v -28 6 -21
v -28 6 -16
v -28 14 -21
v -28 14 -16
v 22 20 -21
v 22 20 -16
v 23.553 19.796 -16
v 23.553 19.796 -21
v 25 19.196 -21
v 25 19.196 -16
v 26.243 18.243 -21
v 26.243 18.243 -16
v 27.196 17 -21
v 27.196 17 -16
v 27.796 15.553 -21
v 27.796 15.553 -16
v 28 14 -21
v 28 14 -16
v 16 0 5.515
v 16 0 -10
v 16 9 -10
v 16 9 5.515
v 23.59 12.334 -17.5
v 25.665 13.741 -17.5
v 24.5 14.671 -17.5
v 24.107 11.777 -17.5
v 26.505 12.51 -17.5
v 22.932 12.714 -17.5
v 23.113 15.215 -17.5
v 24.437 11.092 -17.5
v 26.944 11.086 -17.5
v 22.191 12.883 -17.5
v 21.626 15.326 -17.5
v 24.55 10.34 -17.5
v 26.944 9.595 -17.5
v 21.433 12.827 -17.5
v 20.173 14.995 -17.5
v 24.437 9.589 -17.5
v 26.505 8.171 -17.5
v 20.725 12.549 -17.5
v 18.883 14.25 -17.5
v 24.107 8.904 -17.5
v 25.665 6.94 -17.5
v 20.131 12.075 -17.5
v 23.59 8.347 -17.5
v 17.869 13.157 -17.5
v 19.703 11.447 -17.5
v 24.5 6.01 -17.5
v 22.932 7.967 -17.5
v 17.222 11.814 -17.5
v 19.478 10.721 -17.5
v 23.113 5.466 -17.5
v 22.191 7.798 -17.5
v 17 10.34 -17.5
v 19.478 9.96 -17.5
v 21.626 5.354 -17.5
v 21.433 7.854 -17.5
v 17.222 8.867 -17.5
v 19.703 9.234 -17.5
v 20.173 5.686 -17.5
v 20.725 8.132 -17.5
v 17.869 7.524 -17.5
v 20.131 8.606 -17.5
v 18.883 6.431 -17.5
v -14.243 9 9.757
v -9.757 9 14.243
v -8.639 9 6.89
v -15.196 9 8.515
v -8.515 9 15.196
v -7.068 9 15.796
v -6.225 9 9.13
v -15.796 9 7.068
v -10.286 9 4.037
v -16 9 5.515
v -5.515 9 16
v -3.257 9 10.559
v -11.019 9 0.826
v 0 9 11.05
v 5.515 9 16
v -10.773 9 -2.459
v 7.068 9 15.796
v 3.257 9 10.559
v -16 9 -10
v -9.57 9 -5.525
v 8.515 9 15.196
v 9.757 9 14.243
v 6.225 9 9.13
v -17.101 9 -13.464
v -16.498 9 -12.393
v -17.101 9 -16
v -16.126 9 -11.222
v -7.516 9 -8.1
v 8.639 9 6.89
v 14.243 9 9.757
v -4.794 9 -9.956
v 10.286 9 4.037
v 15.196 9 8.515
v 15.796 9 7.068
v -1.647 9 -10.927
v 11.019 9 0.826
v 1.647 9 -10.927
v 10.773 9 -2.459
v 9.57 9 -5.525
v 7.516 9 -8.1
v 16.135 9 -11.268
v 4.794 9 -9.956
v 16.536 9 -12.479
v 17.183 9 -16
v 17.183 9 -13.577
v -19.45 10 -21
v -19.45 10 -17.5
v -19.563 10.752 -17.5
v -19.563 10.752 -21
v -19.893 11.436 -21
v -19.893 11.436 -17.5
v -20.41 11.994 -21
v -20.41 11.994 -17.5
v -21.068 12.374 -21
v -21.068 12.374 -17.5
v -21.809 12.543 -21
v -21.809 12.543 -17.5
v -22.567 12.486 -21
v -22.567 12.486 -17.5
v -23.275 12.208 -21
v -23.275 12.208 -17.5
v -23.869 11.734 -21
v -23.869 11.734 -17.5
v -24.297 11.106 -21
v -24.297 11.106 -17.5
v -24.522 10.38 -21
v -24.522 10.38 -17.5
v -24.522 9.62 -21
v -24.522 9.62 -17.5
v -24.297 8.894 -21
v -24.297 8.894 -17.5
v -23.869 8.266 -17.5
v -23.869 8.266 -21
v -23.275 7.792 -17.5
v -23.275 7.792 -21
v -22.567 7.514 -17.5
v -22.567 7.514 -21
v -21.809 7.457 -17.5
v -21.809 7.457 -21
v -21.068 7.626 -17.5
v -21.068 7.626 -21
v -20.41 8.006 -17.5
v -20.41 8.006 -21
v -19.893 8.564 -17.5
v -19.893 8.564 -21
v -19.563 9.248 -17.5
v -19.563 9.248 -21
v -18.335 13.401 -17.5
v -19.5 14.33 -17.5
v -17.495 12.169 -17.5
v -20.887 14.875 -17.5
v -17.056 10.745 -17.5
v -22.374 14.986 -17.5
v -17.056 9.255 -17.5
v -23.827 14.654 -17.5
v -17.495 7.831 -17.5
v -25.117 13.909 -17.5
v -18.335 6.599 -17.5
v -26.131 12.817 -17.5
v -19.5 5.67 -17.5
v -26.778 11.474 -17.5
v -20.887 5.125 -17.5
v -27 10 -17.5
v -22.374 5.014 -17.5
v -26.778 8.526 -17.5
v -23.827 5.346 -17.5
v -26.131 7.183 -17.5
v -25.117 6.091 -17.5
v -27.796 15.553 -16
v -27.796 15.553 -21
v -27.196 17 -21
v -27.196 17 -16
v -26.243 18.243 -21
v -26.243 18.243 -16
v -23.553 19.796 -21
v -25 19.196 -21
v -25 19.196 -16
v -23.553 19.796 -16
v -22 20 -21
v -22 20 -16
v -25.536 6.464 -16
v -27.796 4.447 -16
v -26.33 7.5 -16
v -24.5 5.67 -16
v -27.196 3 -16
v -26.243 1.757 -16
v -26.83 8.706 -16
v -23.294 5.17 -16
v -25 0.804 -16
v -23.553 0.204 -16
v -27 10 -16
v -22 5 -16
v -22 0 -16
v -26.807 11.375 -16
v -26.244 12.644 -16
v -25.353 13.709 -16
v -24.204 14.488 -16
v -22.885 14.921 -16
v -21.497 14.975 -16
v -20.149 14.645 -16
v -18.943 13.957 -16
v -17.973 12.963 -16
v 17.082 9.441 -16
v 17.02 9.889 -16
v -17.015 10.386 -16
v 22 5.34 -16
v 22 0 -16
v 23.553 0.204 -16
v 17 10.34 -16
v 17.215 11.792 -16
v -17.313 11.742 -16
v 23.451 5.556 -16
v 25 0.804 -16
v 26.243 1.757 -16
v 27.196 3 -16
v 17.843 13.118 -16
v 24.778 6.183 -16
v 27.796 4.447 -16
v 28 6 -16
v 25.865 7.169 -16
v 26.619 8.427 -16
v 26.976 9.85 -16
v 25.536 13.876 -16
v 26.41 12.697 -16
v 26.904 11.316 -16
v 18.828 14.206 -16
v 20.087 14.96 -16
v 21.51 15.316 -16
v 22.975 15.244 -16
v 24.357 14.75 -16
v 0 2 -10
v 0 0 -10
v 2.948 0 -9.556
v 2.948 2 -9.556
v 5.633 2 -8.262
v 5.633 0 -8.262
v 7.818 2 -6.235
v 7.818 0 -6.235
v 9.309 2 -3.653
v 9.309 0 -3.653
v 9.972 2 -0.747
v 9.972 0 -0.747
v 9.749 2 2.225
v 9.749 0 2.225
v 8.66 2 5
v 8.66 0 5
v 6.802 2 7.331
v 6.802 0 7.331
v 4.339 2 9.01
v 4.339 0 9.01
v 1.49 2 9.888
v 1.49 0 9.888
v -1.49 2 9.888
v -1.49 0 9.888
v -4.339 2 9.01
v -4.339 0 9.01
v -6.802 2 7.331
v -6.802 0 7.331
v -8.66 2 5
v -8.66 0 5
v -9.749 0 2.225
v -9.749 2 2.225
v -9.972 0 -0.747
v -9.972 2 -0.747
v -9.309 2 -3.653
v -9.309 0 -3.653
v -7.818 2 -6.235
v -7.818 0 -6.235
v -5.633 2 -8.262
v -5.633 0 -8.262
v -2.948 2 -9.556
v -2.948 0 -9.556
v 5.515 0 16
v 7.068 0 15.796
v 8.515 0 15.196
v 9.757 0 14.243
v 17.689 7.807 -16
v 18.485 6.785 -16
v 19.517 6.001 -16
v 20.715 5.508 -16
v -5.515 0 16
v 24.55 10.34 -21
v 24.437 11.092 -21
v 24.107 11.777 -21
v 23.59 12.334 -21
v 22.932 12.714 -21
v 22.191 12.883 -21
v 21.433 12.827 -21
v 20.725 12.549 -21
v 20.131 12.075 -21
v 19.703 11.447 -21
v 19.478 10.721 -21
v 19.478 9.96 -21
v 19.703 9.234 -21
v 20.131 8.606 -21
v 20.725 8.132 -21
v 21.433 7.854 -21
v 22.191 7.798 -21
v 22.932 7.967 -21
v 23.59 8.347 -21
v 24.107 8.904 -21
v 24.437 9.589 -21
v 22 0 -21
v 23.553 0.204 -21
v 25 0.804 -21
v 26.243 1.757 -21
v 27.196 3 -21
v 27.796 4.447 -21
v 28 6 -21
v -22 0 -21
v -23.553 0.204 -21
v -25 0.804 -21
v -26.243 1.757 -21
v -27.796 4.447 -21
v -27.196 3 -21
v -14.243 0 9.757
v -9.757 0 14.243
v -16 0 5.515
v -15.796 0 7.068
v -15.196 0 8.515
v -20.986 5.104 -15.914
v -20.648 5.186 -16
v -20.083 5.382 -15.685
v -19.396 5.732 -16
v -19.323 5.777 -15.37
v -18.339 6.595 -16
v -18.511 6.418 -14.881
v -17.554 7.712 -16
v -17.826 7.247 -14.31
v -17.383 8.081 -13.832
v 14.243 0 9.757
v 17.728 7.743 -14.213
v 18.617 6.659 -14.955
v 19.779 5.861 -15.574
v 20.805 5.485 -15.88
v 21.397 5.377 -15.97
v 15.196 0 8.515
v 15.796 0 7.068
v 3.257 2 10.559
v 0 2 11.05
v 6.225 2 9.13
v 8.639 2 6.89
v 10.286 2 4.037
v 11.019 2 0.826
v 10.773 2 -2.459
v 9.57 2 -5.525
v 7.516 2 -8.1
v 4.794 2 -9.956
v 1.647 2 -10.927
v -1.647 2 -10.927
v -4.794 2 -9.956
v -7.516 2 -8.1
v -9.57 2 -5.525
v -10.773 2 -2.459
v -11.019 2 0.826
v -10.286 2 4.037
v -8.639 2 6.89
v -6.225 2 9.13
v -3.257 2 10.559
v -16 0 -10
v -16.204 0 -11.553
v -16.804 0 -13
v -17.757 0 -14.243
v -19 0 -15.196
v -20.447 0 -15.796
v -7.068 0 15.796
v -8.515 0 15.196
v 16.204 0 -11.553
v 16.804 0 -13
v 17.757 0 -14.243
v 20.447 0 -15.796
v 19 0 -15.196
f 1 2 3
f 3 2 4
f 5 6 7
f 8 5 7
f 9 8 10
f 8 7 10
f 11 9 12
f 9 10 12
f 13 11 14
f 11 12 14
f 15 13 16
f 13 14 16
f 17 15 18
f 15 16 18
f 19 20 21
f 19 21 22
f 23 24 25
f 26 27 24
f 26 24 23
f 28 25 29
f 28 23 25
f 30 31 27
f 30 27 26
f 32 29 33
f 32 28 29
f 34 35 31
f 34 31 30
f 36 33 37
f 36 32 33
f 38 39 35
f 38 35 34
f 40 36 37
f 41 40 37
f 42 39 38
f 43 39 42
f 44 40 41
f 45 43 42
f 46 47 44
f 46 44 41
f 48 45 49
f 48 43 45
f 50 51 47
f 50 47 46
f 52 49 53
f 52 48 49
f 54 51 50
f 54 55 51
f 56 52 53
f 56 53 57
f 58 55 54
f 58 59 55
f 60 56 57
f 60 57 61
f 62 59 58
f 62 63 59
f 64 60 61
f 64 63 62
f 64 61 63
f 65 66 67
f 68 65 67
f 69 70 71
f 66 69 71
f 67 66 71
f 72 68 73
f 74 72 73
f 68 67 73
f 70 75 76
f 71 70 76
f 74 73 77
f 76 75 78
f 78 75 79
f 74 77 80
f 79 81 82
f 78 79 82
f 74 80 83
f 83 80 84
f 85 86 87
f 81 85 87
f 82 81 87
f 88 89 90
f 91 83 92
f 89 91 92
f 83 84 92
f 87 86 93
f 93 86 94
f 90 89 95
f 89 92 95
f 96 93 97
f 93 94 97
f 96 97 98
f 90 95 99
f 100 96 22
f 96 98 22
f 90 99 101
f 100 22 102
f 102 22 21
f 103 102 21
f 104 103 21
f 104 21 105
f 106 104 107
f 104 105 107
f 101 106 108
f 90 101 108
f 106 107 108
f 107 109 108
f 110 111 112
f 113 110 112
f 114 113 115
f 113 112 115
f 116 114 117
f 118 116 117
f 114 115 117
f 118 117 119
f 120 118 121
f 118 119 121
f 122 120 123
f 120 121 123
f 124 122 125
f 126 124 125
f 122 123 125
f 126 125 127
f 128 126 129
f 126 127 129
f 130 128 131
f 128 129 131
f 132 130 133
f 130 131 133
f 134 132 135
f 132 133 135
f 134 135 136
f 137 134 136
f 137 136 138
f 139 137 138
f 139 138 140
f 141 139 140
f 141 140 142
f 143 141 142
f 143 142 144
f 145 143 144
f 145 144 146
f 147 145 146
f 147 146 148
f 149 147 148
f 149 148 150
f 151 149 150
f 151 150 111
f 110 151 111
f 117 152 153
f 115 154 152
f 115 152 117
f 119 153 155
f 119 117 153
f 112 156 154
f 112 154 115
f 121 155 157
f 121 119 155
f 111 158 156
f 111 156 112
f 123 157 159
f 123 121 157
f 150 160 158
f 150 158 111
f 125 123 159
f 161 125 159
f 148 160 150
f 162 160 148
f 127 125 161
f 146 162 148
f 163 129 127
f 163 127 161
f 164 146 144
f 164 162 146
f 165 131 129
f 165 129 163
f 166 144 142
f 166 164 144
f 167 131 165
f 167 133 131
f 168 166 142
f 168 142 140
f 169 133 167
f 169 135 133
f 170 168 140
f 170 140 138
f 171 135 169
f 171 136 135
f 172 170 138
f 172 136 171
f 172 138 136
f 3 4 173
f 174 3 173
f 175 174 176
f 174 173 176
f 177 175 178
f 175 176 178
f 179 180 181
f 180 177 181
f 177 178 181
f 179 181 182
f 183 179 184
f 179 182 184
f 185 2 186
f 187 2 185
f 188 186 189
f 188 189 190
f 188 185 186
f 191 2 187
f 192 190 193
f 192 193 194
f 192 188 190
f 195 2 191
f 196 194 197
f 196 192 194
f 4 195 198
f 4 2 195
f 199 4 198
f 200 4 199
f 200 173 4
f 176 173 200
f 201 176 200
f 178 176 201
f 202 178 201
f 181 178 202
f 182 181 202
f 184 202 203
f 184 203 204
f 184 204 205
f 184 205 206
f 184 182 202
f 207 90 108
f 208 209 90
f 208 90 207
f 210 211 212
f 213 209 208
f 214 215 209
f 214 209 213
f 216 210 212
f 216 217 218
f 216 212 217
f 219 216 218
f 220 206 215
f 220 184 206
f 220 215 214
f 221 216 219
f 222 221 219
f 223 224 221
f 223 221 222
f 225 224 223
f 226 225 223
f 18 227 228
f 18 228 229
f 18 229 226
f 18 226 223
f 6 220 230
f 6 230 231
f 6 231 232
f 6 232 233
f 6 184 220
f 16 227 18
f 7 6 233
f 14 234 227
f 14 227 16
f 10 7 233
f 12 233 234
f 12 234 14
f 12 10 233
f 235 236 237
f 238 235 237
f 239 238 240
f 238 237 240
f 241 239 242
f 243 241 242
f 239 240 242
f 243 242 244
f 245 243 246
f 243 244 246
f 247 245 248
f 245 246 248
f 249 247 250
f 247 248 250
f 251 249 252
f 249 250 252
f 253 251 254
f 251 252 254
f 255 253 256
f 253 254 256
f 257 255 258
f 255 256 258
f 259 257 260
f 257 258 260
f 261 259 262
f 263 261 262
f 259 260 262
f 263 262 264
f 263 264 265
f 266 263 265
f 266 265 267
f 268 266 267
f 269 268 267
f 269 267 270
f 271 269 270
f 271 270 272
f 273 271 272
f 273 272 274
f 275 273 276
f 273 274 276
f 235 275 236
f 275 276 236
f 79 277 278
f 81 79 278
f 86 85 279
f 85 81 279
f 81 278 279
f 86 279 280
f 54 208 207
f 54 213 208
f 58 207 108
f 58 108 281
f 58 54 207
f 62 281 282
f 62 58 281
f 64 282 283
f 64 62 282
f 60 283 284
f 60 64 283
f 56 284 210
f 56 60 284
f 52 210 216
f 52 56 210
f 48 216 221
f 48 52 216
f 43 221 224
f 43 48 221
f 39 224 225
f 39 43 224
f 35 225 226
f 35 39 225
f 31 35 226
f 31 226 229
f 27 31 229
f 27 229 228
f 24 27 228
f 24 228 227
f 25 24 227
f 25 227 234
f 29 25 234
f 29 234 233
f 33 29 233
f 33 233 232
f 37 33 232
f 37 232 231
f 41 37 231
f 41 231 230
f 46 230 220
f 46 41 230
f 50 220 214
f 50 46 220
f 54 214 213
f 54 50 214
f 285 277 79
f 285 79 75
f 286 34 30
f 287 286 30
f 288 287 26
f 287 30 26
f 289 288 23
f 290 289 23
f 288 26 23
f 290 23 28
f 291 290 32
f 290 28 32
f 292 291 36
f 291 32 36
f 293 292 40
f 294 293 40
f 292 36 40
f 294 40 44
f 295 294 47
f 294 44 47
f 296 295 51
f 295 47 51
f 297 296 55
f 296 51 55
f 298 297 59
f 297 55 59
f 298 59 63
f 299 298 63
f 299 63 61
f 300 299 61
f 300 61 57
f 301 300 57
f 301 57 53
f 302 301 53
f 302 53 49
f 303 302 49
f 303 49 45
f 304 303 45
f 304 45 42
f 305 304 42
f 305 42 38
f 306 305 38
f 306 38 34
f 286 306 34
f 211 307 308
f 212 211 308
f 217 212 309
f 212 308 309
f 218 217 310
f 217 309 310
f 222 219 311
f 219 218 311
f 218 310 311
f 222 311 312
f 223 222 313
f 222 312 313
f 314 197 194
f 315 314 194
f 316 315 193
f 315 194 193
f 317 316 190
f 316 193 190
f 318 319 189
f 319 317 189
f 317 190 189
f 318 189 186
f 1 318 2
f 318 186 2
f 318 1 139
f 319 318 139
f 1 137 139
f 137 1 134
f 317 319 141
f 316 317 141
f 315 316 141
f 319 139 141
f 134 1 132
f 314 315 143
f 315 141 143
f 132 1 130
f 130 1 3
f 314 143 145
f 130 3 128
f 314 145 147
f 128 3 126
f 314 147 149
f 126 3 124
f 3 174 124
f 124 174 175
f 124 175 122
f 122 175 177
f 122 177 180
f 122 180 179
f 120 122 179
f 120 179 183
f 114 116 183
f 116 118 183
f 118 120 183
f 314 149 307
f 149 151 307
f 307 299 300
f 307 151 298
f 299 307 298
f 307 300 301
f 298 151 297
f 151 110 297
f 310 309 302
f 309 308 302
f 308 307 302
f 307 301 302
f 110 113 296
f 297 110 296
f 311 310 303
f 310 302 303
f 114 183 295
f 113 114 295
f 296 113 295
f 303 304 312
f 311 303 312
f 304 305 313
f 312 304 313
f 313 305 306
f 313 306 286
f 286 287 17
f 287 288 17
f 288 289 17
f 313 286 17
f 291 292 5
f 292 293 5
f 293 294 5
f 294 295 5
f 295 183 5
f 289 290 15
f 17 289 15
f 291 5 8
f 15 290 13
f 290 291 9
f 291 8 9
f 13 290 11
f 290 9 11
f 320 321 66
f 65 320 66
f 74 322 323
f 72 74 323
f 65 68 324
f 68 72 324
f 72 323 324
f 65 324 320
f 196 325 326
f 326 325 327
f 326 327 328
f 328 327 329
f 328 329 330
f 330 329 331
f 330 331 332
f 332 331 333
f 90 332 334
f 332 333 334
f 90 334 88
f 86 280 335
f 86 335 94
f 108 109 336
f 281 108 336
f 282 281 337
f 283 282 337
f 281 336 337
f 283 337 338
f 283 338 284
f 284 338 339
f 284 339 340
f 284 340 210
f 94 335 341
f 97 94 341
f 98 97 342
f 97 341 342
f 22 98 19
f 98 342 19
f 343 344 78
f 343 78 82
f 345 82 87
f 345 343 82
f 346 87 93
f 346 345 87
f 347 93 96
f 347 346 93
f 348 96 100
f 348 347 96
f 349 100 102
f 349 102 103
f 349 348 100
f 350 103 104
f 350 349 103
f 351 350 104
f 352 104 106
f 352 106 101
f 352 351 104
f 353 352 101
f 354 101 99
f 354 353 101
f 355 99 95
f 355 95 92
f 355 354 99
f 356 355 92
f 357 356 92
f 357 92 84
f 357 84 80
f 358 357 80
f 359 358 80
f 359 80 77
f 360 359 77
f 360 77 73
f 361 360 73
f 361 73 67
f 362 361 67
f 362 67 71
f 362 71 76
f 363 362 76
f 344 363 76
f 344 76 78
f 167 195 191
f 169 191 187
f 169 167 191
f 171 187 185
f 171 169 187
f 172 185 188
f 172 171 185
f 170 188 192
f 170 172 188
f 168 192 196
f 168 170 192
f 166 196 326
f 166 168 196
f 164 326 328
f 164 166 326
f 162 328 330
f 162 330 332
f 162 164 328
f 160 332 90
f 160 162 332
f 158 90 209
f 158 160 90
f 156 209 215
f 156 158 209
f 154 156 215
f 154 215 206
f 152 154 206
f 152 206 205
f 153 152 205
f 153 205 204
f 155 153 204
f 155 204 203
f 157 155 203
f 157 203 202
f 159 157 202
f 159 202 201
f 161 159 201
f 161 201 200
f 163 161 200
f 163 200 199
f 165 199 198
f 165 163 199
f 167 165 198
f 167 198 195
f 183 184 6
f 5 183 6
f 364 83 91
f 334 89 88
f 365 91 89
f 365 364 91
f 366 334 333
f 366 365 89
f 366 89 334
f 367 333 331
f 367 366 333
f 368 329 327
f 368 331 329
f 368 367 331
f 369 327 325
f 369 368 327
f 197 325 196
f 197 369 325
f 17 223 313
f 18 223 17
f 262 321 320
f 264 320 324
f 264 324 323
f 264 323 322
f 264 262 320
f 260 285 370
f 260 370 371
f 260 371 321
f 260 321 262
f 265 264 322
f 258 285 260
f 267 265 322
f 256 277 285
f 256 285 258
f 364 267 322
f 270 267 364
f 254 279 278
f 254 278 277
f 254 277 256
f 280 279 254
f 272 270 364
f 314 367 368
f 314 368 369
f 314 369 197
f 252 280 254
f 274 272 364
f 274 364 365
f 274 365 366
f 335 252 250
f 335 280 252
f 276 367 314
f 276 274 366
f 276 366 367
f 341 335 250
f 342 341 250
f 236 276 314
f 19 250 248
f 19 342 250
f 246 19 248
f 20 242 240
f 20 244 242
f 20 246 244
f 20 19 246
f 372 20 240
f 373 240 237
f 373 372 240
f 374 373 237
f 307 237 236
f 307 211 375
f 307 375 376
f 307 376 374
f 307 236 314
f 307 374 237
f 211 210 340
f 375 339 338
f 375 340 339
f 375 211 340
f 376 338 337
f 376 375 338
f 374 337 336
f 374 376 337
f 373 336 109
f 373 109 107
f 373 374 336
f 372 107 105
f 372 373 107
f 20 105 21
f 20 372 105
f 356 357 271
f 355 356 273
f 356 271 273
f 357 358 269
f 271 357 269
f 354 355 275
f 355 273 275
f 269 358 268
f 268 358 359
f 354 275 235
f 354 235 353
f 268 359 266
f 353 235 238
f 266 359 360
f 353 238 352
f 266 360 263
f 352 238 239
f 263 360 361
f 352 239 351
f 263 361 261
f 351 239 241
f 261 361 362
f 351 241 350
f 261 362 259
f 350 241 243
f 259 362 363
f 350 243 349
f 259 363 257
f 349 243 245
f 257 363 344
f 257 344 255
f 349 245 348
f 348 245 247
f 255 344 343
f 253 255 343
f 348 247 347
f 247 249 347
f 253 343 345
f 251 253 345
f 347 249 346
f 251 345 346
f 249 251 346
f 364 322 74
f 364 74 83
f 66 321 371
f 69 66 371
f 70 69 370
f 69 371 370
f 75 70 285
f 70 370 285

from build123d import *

# Parameters (mm, degrees)
SKETCH2_R               = 11.05
BOSS_EXTRUDE1_DEPTH     = 9
CHAMFER1_SIZE           = 8
SKETCH3_R               = 13
SKETCH3_R_2             = 10
BOSS_EXTRUDE2_DEPTH     = 2
SKETCH5_W               = 56
SKETCH5_H               = 11
BOSS_EXTRUDE3_DEPTH     = 5
SKETCH6_R               = 2.55
CUT_EXTRUDE5_DEPTH      = 47.989360498
CUT_EXTRUDE6_DEPTH      = 10
CUT_EXTRUDE6_DEPTH_BACK = 1.5
SKETCH7_R               = 5
FILLET1_R               = 6


with BuildPart() as part:
    # Sketch2 → Boss-Extrude1 (new body)
    with BuildSketch(Plane(origin=(0, 0, 0), x_dir=(1, 0, 0), z_dir=(0, 1, 0))):
        Polygon((-28, 21), (28, 21), (28, 16), (16, 16), (16, -16), (-16, -16), (-16, 16), (-28, 16), align=None)
        with Locations(Location((0, 0, 0), (0, 0, 270))):
            Circle(SKETCH2_R, mode=Mode.SUBTRACT)
    extrude(amount=BOSS_EXTRUDE1_DEPTH)

    # Chamfer1
    chamfer1_edges = [part.edges().sort_by_distance(p)[0] for p in [
        (16, 4.5, 16),
        (-16, 4.5, 16),
    ]]
    chamfer(chamfer1_edges, length=CHAMFER1_SIZE)

    # Sketch3 → Boss-Extrude2 (add)
    with BuildSketch(Plane.XZ):
        Circle(SKETCH3_R)
        with Locations(Location((0, 0, 0), (0, 0, 270))):
            Circle(SKETCH3_R_2, mode=Mode.SUBTRACT)
    extrude(amount=-BOSS_EXTRUDE2_DEPTH)

    # Sketch5 → Boss-Extrude3 (add)
    with BuildSketch(Plane.XY.offset(-16)):
        with Locations((0, 14.5)):
            Rectangle(SKETCH5_W, SKETCH5_H)
    extrude(amount=-BOSS_EXTRUDE3_DEPTH)

    # Sketch6 → Cut-Extrude5 (cut, through all)
    with BuildSketch(Plane.XY.offset(-16)):
        with Locations((-22, 10)):
            Circle(SKETCH6_R)
        with Locations((22, 10.340473159)):
            Circle(SKETCH6_R)
    extrude(amount=-CUT_EXTRUDE5_DEPTH, mode=Mode.SUBTRACT)

    # Sketch7 → Cut-Extrude6 (cut, two sides: drawn at the far end of the back side and taken through both)
    with BuildSketch(Plane.XY.offset(-16).offset(-CUT_EXTRUDE6_DEPTH_BACK)):
        with Locations(Location((22, 10.340473159, 0), (0, 0, 180))):
            Circle(SKETCH7_R)
        with Locations(Location((-22, 10, 0), (0, 0, 180))):
            Circle(SKETCH7_R)
    extrude(amount=CUT_EXTRUDE6_DEPTH + CUT_EXTRUDE6_DEPTH_BACK, mode=Mode.SUBTRACT)

    # Fillet1
    # the kernel refuses this fillet: 6 mm, written as the material it adds along each edge
    with BuildSketch(Plane(origin=(-16, 0, -16), x_dir=(-1, 0, 0), z_dir=(0, 1, 0))) as fillet1_piece_1_section:
        with BuildLine():
            CenterArc((FILLET1_R, FILLET1_R), FILLET1_R, 180, 90)
            Line((0, FILLET1_R), (0, 0))
            Line((0, 0), (FILLET1_R, 0))
        make_face()
    fillet1_piece_1 = extrude(amount=9, mode=Mode.PRIVATE)
    fillet1_piece_1 = fillet1_piece_1 - Plane(origin=(-22, 10, -14.524998949), x_dir=(-1, 0, 0), z_dir=(0, 0, 1)) * Cylinder(5, 43, mode=Mode.PRIVATE)
    add(fillet1_piece_1)
    with BuildSketch(Plane(origin=(16, 0, -16), x_dir=(0, 0, 1), z_dir=(0, 1, 0))) as fillet1_piece_2_section:
        with BuildLine():
            CenterArc((FILLET1_R, FILLET1_R), FILLET1_R, 180, 90)
            Line((0, FILLET1_R), (0, 0))
            Line((0, 0), (FILLET1_R, 0))
        make_face()
    fillet1_piece_2 = extrude(amount=9, mode=Mode.PRIVATE)
    fillet1_piece_2 = fillet1_piece_2 - Plane(origin=(22, 10.340473159, -14.541701279), x_dir=(-1, 0, 0), z_dir=(0, 0, 1)) * Cylinder(5, 42, mode=Mode.PRIVATE)
    add(fillet1_piece_2)
    # the kernel refuses this fillet: 6 mm, written as the material it takes off along each edge
    with BuildSketch(Plane(origin=(16, -6.213203436, 8), x_dir=(0, 0, -1), z_dir=(0, 1, 0))) as fillet1_2_piece_1:
        with BuildLine():
            CenterArc((FILLET1_R * 0.414213562373, FILLET1_R), FILLET1_R, 225, 45)
            Line((-FILLET1_R * 0.292893218813, FILLET1_R * 0.292893218813), (0, 0))
            Line((0, 0), (FILLET1_R * 0.414213562373, 0))
        make_face()
    extrude(amount=21.426406871, mode=Mode.SUBTRACT)
    with BuildSketch(Plane(origin=(8, -6.213203436, 16), x_dir=(-1, 0, 0), z_dir=(0, 1, 0)), Plane(origin=(-8, -6.213203436, 16), x_dir=(-0.7071067811865481, 0, -0.707106781186547), z_dir=(0, 1, 0)), Plane(origin=(-16, -6.213203436, 8), x_dir=(0, 0, -1), z_dir=(0, 1, 0))) as fillet1_2_piece_2:
        with BuildLine():
            CenterArc((FILLET1_R * 0.414213562373, -FILLET1_R), FILLET1_R, 90, 45)
            Line((-FILLET1_R * 0.292893218813, -FILLET1_R * 0.292893218813), (0, 0))
            Line((0, 0), (FILLET1_R * 0.414213562373, 0))
        make_face()
    extrude(amount=21.426406871, mode=Mode.SUBTRACT)
    with BuildSketch(Plane(origin=(28, 0, -36), x_dir=(0, 1, 0), z_dir=(0, 0, 1)), Plane(origin=(28, 20, -1), x_dir=(0, -1, 0), z_dir=(0, 0, -1)), Plane(origin=(-28, 20, -1), x_dir=(1, 0, 0), z_dir=(0, 0, -1)), Plane(origin=(-28, 0, -1), x_dir=(0, 1, 0), z_dir=(0, 0, -1))) as fillet1_2_piece_3:
        with BuildLine():
            CenterArc((FILLET1_R, FILLET1_R), FILLET1_R, 180, 90)
            Line((0, FILLET1_R), (0, 0))
            Line((0, 0), (FILLET1_R, 0))
        make_face()
    extrude(amount=35, mode=Mode.SUBTRACT)


solid = part.part
